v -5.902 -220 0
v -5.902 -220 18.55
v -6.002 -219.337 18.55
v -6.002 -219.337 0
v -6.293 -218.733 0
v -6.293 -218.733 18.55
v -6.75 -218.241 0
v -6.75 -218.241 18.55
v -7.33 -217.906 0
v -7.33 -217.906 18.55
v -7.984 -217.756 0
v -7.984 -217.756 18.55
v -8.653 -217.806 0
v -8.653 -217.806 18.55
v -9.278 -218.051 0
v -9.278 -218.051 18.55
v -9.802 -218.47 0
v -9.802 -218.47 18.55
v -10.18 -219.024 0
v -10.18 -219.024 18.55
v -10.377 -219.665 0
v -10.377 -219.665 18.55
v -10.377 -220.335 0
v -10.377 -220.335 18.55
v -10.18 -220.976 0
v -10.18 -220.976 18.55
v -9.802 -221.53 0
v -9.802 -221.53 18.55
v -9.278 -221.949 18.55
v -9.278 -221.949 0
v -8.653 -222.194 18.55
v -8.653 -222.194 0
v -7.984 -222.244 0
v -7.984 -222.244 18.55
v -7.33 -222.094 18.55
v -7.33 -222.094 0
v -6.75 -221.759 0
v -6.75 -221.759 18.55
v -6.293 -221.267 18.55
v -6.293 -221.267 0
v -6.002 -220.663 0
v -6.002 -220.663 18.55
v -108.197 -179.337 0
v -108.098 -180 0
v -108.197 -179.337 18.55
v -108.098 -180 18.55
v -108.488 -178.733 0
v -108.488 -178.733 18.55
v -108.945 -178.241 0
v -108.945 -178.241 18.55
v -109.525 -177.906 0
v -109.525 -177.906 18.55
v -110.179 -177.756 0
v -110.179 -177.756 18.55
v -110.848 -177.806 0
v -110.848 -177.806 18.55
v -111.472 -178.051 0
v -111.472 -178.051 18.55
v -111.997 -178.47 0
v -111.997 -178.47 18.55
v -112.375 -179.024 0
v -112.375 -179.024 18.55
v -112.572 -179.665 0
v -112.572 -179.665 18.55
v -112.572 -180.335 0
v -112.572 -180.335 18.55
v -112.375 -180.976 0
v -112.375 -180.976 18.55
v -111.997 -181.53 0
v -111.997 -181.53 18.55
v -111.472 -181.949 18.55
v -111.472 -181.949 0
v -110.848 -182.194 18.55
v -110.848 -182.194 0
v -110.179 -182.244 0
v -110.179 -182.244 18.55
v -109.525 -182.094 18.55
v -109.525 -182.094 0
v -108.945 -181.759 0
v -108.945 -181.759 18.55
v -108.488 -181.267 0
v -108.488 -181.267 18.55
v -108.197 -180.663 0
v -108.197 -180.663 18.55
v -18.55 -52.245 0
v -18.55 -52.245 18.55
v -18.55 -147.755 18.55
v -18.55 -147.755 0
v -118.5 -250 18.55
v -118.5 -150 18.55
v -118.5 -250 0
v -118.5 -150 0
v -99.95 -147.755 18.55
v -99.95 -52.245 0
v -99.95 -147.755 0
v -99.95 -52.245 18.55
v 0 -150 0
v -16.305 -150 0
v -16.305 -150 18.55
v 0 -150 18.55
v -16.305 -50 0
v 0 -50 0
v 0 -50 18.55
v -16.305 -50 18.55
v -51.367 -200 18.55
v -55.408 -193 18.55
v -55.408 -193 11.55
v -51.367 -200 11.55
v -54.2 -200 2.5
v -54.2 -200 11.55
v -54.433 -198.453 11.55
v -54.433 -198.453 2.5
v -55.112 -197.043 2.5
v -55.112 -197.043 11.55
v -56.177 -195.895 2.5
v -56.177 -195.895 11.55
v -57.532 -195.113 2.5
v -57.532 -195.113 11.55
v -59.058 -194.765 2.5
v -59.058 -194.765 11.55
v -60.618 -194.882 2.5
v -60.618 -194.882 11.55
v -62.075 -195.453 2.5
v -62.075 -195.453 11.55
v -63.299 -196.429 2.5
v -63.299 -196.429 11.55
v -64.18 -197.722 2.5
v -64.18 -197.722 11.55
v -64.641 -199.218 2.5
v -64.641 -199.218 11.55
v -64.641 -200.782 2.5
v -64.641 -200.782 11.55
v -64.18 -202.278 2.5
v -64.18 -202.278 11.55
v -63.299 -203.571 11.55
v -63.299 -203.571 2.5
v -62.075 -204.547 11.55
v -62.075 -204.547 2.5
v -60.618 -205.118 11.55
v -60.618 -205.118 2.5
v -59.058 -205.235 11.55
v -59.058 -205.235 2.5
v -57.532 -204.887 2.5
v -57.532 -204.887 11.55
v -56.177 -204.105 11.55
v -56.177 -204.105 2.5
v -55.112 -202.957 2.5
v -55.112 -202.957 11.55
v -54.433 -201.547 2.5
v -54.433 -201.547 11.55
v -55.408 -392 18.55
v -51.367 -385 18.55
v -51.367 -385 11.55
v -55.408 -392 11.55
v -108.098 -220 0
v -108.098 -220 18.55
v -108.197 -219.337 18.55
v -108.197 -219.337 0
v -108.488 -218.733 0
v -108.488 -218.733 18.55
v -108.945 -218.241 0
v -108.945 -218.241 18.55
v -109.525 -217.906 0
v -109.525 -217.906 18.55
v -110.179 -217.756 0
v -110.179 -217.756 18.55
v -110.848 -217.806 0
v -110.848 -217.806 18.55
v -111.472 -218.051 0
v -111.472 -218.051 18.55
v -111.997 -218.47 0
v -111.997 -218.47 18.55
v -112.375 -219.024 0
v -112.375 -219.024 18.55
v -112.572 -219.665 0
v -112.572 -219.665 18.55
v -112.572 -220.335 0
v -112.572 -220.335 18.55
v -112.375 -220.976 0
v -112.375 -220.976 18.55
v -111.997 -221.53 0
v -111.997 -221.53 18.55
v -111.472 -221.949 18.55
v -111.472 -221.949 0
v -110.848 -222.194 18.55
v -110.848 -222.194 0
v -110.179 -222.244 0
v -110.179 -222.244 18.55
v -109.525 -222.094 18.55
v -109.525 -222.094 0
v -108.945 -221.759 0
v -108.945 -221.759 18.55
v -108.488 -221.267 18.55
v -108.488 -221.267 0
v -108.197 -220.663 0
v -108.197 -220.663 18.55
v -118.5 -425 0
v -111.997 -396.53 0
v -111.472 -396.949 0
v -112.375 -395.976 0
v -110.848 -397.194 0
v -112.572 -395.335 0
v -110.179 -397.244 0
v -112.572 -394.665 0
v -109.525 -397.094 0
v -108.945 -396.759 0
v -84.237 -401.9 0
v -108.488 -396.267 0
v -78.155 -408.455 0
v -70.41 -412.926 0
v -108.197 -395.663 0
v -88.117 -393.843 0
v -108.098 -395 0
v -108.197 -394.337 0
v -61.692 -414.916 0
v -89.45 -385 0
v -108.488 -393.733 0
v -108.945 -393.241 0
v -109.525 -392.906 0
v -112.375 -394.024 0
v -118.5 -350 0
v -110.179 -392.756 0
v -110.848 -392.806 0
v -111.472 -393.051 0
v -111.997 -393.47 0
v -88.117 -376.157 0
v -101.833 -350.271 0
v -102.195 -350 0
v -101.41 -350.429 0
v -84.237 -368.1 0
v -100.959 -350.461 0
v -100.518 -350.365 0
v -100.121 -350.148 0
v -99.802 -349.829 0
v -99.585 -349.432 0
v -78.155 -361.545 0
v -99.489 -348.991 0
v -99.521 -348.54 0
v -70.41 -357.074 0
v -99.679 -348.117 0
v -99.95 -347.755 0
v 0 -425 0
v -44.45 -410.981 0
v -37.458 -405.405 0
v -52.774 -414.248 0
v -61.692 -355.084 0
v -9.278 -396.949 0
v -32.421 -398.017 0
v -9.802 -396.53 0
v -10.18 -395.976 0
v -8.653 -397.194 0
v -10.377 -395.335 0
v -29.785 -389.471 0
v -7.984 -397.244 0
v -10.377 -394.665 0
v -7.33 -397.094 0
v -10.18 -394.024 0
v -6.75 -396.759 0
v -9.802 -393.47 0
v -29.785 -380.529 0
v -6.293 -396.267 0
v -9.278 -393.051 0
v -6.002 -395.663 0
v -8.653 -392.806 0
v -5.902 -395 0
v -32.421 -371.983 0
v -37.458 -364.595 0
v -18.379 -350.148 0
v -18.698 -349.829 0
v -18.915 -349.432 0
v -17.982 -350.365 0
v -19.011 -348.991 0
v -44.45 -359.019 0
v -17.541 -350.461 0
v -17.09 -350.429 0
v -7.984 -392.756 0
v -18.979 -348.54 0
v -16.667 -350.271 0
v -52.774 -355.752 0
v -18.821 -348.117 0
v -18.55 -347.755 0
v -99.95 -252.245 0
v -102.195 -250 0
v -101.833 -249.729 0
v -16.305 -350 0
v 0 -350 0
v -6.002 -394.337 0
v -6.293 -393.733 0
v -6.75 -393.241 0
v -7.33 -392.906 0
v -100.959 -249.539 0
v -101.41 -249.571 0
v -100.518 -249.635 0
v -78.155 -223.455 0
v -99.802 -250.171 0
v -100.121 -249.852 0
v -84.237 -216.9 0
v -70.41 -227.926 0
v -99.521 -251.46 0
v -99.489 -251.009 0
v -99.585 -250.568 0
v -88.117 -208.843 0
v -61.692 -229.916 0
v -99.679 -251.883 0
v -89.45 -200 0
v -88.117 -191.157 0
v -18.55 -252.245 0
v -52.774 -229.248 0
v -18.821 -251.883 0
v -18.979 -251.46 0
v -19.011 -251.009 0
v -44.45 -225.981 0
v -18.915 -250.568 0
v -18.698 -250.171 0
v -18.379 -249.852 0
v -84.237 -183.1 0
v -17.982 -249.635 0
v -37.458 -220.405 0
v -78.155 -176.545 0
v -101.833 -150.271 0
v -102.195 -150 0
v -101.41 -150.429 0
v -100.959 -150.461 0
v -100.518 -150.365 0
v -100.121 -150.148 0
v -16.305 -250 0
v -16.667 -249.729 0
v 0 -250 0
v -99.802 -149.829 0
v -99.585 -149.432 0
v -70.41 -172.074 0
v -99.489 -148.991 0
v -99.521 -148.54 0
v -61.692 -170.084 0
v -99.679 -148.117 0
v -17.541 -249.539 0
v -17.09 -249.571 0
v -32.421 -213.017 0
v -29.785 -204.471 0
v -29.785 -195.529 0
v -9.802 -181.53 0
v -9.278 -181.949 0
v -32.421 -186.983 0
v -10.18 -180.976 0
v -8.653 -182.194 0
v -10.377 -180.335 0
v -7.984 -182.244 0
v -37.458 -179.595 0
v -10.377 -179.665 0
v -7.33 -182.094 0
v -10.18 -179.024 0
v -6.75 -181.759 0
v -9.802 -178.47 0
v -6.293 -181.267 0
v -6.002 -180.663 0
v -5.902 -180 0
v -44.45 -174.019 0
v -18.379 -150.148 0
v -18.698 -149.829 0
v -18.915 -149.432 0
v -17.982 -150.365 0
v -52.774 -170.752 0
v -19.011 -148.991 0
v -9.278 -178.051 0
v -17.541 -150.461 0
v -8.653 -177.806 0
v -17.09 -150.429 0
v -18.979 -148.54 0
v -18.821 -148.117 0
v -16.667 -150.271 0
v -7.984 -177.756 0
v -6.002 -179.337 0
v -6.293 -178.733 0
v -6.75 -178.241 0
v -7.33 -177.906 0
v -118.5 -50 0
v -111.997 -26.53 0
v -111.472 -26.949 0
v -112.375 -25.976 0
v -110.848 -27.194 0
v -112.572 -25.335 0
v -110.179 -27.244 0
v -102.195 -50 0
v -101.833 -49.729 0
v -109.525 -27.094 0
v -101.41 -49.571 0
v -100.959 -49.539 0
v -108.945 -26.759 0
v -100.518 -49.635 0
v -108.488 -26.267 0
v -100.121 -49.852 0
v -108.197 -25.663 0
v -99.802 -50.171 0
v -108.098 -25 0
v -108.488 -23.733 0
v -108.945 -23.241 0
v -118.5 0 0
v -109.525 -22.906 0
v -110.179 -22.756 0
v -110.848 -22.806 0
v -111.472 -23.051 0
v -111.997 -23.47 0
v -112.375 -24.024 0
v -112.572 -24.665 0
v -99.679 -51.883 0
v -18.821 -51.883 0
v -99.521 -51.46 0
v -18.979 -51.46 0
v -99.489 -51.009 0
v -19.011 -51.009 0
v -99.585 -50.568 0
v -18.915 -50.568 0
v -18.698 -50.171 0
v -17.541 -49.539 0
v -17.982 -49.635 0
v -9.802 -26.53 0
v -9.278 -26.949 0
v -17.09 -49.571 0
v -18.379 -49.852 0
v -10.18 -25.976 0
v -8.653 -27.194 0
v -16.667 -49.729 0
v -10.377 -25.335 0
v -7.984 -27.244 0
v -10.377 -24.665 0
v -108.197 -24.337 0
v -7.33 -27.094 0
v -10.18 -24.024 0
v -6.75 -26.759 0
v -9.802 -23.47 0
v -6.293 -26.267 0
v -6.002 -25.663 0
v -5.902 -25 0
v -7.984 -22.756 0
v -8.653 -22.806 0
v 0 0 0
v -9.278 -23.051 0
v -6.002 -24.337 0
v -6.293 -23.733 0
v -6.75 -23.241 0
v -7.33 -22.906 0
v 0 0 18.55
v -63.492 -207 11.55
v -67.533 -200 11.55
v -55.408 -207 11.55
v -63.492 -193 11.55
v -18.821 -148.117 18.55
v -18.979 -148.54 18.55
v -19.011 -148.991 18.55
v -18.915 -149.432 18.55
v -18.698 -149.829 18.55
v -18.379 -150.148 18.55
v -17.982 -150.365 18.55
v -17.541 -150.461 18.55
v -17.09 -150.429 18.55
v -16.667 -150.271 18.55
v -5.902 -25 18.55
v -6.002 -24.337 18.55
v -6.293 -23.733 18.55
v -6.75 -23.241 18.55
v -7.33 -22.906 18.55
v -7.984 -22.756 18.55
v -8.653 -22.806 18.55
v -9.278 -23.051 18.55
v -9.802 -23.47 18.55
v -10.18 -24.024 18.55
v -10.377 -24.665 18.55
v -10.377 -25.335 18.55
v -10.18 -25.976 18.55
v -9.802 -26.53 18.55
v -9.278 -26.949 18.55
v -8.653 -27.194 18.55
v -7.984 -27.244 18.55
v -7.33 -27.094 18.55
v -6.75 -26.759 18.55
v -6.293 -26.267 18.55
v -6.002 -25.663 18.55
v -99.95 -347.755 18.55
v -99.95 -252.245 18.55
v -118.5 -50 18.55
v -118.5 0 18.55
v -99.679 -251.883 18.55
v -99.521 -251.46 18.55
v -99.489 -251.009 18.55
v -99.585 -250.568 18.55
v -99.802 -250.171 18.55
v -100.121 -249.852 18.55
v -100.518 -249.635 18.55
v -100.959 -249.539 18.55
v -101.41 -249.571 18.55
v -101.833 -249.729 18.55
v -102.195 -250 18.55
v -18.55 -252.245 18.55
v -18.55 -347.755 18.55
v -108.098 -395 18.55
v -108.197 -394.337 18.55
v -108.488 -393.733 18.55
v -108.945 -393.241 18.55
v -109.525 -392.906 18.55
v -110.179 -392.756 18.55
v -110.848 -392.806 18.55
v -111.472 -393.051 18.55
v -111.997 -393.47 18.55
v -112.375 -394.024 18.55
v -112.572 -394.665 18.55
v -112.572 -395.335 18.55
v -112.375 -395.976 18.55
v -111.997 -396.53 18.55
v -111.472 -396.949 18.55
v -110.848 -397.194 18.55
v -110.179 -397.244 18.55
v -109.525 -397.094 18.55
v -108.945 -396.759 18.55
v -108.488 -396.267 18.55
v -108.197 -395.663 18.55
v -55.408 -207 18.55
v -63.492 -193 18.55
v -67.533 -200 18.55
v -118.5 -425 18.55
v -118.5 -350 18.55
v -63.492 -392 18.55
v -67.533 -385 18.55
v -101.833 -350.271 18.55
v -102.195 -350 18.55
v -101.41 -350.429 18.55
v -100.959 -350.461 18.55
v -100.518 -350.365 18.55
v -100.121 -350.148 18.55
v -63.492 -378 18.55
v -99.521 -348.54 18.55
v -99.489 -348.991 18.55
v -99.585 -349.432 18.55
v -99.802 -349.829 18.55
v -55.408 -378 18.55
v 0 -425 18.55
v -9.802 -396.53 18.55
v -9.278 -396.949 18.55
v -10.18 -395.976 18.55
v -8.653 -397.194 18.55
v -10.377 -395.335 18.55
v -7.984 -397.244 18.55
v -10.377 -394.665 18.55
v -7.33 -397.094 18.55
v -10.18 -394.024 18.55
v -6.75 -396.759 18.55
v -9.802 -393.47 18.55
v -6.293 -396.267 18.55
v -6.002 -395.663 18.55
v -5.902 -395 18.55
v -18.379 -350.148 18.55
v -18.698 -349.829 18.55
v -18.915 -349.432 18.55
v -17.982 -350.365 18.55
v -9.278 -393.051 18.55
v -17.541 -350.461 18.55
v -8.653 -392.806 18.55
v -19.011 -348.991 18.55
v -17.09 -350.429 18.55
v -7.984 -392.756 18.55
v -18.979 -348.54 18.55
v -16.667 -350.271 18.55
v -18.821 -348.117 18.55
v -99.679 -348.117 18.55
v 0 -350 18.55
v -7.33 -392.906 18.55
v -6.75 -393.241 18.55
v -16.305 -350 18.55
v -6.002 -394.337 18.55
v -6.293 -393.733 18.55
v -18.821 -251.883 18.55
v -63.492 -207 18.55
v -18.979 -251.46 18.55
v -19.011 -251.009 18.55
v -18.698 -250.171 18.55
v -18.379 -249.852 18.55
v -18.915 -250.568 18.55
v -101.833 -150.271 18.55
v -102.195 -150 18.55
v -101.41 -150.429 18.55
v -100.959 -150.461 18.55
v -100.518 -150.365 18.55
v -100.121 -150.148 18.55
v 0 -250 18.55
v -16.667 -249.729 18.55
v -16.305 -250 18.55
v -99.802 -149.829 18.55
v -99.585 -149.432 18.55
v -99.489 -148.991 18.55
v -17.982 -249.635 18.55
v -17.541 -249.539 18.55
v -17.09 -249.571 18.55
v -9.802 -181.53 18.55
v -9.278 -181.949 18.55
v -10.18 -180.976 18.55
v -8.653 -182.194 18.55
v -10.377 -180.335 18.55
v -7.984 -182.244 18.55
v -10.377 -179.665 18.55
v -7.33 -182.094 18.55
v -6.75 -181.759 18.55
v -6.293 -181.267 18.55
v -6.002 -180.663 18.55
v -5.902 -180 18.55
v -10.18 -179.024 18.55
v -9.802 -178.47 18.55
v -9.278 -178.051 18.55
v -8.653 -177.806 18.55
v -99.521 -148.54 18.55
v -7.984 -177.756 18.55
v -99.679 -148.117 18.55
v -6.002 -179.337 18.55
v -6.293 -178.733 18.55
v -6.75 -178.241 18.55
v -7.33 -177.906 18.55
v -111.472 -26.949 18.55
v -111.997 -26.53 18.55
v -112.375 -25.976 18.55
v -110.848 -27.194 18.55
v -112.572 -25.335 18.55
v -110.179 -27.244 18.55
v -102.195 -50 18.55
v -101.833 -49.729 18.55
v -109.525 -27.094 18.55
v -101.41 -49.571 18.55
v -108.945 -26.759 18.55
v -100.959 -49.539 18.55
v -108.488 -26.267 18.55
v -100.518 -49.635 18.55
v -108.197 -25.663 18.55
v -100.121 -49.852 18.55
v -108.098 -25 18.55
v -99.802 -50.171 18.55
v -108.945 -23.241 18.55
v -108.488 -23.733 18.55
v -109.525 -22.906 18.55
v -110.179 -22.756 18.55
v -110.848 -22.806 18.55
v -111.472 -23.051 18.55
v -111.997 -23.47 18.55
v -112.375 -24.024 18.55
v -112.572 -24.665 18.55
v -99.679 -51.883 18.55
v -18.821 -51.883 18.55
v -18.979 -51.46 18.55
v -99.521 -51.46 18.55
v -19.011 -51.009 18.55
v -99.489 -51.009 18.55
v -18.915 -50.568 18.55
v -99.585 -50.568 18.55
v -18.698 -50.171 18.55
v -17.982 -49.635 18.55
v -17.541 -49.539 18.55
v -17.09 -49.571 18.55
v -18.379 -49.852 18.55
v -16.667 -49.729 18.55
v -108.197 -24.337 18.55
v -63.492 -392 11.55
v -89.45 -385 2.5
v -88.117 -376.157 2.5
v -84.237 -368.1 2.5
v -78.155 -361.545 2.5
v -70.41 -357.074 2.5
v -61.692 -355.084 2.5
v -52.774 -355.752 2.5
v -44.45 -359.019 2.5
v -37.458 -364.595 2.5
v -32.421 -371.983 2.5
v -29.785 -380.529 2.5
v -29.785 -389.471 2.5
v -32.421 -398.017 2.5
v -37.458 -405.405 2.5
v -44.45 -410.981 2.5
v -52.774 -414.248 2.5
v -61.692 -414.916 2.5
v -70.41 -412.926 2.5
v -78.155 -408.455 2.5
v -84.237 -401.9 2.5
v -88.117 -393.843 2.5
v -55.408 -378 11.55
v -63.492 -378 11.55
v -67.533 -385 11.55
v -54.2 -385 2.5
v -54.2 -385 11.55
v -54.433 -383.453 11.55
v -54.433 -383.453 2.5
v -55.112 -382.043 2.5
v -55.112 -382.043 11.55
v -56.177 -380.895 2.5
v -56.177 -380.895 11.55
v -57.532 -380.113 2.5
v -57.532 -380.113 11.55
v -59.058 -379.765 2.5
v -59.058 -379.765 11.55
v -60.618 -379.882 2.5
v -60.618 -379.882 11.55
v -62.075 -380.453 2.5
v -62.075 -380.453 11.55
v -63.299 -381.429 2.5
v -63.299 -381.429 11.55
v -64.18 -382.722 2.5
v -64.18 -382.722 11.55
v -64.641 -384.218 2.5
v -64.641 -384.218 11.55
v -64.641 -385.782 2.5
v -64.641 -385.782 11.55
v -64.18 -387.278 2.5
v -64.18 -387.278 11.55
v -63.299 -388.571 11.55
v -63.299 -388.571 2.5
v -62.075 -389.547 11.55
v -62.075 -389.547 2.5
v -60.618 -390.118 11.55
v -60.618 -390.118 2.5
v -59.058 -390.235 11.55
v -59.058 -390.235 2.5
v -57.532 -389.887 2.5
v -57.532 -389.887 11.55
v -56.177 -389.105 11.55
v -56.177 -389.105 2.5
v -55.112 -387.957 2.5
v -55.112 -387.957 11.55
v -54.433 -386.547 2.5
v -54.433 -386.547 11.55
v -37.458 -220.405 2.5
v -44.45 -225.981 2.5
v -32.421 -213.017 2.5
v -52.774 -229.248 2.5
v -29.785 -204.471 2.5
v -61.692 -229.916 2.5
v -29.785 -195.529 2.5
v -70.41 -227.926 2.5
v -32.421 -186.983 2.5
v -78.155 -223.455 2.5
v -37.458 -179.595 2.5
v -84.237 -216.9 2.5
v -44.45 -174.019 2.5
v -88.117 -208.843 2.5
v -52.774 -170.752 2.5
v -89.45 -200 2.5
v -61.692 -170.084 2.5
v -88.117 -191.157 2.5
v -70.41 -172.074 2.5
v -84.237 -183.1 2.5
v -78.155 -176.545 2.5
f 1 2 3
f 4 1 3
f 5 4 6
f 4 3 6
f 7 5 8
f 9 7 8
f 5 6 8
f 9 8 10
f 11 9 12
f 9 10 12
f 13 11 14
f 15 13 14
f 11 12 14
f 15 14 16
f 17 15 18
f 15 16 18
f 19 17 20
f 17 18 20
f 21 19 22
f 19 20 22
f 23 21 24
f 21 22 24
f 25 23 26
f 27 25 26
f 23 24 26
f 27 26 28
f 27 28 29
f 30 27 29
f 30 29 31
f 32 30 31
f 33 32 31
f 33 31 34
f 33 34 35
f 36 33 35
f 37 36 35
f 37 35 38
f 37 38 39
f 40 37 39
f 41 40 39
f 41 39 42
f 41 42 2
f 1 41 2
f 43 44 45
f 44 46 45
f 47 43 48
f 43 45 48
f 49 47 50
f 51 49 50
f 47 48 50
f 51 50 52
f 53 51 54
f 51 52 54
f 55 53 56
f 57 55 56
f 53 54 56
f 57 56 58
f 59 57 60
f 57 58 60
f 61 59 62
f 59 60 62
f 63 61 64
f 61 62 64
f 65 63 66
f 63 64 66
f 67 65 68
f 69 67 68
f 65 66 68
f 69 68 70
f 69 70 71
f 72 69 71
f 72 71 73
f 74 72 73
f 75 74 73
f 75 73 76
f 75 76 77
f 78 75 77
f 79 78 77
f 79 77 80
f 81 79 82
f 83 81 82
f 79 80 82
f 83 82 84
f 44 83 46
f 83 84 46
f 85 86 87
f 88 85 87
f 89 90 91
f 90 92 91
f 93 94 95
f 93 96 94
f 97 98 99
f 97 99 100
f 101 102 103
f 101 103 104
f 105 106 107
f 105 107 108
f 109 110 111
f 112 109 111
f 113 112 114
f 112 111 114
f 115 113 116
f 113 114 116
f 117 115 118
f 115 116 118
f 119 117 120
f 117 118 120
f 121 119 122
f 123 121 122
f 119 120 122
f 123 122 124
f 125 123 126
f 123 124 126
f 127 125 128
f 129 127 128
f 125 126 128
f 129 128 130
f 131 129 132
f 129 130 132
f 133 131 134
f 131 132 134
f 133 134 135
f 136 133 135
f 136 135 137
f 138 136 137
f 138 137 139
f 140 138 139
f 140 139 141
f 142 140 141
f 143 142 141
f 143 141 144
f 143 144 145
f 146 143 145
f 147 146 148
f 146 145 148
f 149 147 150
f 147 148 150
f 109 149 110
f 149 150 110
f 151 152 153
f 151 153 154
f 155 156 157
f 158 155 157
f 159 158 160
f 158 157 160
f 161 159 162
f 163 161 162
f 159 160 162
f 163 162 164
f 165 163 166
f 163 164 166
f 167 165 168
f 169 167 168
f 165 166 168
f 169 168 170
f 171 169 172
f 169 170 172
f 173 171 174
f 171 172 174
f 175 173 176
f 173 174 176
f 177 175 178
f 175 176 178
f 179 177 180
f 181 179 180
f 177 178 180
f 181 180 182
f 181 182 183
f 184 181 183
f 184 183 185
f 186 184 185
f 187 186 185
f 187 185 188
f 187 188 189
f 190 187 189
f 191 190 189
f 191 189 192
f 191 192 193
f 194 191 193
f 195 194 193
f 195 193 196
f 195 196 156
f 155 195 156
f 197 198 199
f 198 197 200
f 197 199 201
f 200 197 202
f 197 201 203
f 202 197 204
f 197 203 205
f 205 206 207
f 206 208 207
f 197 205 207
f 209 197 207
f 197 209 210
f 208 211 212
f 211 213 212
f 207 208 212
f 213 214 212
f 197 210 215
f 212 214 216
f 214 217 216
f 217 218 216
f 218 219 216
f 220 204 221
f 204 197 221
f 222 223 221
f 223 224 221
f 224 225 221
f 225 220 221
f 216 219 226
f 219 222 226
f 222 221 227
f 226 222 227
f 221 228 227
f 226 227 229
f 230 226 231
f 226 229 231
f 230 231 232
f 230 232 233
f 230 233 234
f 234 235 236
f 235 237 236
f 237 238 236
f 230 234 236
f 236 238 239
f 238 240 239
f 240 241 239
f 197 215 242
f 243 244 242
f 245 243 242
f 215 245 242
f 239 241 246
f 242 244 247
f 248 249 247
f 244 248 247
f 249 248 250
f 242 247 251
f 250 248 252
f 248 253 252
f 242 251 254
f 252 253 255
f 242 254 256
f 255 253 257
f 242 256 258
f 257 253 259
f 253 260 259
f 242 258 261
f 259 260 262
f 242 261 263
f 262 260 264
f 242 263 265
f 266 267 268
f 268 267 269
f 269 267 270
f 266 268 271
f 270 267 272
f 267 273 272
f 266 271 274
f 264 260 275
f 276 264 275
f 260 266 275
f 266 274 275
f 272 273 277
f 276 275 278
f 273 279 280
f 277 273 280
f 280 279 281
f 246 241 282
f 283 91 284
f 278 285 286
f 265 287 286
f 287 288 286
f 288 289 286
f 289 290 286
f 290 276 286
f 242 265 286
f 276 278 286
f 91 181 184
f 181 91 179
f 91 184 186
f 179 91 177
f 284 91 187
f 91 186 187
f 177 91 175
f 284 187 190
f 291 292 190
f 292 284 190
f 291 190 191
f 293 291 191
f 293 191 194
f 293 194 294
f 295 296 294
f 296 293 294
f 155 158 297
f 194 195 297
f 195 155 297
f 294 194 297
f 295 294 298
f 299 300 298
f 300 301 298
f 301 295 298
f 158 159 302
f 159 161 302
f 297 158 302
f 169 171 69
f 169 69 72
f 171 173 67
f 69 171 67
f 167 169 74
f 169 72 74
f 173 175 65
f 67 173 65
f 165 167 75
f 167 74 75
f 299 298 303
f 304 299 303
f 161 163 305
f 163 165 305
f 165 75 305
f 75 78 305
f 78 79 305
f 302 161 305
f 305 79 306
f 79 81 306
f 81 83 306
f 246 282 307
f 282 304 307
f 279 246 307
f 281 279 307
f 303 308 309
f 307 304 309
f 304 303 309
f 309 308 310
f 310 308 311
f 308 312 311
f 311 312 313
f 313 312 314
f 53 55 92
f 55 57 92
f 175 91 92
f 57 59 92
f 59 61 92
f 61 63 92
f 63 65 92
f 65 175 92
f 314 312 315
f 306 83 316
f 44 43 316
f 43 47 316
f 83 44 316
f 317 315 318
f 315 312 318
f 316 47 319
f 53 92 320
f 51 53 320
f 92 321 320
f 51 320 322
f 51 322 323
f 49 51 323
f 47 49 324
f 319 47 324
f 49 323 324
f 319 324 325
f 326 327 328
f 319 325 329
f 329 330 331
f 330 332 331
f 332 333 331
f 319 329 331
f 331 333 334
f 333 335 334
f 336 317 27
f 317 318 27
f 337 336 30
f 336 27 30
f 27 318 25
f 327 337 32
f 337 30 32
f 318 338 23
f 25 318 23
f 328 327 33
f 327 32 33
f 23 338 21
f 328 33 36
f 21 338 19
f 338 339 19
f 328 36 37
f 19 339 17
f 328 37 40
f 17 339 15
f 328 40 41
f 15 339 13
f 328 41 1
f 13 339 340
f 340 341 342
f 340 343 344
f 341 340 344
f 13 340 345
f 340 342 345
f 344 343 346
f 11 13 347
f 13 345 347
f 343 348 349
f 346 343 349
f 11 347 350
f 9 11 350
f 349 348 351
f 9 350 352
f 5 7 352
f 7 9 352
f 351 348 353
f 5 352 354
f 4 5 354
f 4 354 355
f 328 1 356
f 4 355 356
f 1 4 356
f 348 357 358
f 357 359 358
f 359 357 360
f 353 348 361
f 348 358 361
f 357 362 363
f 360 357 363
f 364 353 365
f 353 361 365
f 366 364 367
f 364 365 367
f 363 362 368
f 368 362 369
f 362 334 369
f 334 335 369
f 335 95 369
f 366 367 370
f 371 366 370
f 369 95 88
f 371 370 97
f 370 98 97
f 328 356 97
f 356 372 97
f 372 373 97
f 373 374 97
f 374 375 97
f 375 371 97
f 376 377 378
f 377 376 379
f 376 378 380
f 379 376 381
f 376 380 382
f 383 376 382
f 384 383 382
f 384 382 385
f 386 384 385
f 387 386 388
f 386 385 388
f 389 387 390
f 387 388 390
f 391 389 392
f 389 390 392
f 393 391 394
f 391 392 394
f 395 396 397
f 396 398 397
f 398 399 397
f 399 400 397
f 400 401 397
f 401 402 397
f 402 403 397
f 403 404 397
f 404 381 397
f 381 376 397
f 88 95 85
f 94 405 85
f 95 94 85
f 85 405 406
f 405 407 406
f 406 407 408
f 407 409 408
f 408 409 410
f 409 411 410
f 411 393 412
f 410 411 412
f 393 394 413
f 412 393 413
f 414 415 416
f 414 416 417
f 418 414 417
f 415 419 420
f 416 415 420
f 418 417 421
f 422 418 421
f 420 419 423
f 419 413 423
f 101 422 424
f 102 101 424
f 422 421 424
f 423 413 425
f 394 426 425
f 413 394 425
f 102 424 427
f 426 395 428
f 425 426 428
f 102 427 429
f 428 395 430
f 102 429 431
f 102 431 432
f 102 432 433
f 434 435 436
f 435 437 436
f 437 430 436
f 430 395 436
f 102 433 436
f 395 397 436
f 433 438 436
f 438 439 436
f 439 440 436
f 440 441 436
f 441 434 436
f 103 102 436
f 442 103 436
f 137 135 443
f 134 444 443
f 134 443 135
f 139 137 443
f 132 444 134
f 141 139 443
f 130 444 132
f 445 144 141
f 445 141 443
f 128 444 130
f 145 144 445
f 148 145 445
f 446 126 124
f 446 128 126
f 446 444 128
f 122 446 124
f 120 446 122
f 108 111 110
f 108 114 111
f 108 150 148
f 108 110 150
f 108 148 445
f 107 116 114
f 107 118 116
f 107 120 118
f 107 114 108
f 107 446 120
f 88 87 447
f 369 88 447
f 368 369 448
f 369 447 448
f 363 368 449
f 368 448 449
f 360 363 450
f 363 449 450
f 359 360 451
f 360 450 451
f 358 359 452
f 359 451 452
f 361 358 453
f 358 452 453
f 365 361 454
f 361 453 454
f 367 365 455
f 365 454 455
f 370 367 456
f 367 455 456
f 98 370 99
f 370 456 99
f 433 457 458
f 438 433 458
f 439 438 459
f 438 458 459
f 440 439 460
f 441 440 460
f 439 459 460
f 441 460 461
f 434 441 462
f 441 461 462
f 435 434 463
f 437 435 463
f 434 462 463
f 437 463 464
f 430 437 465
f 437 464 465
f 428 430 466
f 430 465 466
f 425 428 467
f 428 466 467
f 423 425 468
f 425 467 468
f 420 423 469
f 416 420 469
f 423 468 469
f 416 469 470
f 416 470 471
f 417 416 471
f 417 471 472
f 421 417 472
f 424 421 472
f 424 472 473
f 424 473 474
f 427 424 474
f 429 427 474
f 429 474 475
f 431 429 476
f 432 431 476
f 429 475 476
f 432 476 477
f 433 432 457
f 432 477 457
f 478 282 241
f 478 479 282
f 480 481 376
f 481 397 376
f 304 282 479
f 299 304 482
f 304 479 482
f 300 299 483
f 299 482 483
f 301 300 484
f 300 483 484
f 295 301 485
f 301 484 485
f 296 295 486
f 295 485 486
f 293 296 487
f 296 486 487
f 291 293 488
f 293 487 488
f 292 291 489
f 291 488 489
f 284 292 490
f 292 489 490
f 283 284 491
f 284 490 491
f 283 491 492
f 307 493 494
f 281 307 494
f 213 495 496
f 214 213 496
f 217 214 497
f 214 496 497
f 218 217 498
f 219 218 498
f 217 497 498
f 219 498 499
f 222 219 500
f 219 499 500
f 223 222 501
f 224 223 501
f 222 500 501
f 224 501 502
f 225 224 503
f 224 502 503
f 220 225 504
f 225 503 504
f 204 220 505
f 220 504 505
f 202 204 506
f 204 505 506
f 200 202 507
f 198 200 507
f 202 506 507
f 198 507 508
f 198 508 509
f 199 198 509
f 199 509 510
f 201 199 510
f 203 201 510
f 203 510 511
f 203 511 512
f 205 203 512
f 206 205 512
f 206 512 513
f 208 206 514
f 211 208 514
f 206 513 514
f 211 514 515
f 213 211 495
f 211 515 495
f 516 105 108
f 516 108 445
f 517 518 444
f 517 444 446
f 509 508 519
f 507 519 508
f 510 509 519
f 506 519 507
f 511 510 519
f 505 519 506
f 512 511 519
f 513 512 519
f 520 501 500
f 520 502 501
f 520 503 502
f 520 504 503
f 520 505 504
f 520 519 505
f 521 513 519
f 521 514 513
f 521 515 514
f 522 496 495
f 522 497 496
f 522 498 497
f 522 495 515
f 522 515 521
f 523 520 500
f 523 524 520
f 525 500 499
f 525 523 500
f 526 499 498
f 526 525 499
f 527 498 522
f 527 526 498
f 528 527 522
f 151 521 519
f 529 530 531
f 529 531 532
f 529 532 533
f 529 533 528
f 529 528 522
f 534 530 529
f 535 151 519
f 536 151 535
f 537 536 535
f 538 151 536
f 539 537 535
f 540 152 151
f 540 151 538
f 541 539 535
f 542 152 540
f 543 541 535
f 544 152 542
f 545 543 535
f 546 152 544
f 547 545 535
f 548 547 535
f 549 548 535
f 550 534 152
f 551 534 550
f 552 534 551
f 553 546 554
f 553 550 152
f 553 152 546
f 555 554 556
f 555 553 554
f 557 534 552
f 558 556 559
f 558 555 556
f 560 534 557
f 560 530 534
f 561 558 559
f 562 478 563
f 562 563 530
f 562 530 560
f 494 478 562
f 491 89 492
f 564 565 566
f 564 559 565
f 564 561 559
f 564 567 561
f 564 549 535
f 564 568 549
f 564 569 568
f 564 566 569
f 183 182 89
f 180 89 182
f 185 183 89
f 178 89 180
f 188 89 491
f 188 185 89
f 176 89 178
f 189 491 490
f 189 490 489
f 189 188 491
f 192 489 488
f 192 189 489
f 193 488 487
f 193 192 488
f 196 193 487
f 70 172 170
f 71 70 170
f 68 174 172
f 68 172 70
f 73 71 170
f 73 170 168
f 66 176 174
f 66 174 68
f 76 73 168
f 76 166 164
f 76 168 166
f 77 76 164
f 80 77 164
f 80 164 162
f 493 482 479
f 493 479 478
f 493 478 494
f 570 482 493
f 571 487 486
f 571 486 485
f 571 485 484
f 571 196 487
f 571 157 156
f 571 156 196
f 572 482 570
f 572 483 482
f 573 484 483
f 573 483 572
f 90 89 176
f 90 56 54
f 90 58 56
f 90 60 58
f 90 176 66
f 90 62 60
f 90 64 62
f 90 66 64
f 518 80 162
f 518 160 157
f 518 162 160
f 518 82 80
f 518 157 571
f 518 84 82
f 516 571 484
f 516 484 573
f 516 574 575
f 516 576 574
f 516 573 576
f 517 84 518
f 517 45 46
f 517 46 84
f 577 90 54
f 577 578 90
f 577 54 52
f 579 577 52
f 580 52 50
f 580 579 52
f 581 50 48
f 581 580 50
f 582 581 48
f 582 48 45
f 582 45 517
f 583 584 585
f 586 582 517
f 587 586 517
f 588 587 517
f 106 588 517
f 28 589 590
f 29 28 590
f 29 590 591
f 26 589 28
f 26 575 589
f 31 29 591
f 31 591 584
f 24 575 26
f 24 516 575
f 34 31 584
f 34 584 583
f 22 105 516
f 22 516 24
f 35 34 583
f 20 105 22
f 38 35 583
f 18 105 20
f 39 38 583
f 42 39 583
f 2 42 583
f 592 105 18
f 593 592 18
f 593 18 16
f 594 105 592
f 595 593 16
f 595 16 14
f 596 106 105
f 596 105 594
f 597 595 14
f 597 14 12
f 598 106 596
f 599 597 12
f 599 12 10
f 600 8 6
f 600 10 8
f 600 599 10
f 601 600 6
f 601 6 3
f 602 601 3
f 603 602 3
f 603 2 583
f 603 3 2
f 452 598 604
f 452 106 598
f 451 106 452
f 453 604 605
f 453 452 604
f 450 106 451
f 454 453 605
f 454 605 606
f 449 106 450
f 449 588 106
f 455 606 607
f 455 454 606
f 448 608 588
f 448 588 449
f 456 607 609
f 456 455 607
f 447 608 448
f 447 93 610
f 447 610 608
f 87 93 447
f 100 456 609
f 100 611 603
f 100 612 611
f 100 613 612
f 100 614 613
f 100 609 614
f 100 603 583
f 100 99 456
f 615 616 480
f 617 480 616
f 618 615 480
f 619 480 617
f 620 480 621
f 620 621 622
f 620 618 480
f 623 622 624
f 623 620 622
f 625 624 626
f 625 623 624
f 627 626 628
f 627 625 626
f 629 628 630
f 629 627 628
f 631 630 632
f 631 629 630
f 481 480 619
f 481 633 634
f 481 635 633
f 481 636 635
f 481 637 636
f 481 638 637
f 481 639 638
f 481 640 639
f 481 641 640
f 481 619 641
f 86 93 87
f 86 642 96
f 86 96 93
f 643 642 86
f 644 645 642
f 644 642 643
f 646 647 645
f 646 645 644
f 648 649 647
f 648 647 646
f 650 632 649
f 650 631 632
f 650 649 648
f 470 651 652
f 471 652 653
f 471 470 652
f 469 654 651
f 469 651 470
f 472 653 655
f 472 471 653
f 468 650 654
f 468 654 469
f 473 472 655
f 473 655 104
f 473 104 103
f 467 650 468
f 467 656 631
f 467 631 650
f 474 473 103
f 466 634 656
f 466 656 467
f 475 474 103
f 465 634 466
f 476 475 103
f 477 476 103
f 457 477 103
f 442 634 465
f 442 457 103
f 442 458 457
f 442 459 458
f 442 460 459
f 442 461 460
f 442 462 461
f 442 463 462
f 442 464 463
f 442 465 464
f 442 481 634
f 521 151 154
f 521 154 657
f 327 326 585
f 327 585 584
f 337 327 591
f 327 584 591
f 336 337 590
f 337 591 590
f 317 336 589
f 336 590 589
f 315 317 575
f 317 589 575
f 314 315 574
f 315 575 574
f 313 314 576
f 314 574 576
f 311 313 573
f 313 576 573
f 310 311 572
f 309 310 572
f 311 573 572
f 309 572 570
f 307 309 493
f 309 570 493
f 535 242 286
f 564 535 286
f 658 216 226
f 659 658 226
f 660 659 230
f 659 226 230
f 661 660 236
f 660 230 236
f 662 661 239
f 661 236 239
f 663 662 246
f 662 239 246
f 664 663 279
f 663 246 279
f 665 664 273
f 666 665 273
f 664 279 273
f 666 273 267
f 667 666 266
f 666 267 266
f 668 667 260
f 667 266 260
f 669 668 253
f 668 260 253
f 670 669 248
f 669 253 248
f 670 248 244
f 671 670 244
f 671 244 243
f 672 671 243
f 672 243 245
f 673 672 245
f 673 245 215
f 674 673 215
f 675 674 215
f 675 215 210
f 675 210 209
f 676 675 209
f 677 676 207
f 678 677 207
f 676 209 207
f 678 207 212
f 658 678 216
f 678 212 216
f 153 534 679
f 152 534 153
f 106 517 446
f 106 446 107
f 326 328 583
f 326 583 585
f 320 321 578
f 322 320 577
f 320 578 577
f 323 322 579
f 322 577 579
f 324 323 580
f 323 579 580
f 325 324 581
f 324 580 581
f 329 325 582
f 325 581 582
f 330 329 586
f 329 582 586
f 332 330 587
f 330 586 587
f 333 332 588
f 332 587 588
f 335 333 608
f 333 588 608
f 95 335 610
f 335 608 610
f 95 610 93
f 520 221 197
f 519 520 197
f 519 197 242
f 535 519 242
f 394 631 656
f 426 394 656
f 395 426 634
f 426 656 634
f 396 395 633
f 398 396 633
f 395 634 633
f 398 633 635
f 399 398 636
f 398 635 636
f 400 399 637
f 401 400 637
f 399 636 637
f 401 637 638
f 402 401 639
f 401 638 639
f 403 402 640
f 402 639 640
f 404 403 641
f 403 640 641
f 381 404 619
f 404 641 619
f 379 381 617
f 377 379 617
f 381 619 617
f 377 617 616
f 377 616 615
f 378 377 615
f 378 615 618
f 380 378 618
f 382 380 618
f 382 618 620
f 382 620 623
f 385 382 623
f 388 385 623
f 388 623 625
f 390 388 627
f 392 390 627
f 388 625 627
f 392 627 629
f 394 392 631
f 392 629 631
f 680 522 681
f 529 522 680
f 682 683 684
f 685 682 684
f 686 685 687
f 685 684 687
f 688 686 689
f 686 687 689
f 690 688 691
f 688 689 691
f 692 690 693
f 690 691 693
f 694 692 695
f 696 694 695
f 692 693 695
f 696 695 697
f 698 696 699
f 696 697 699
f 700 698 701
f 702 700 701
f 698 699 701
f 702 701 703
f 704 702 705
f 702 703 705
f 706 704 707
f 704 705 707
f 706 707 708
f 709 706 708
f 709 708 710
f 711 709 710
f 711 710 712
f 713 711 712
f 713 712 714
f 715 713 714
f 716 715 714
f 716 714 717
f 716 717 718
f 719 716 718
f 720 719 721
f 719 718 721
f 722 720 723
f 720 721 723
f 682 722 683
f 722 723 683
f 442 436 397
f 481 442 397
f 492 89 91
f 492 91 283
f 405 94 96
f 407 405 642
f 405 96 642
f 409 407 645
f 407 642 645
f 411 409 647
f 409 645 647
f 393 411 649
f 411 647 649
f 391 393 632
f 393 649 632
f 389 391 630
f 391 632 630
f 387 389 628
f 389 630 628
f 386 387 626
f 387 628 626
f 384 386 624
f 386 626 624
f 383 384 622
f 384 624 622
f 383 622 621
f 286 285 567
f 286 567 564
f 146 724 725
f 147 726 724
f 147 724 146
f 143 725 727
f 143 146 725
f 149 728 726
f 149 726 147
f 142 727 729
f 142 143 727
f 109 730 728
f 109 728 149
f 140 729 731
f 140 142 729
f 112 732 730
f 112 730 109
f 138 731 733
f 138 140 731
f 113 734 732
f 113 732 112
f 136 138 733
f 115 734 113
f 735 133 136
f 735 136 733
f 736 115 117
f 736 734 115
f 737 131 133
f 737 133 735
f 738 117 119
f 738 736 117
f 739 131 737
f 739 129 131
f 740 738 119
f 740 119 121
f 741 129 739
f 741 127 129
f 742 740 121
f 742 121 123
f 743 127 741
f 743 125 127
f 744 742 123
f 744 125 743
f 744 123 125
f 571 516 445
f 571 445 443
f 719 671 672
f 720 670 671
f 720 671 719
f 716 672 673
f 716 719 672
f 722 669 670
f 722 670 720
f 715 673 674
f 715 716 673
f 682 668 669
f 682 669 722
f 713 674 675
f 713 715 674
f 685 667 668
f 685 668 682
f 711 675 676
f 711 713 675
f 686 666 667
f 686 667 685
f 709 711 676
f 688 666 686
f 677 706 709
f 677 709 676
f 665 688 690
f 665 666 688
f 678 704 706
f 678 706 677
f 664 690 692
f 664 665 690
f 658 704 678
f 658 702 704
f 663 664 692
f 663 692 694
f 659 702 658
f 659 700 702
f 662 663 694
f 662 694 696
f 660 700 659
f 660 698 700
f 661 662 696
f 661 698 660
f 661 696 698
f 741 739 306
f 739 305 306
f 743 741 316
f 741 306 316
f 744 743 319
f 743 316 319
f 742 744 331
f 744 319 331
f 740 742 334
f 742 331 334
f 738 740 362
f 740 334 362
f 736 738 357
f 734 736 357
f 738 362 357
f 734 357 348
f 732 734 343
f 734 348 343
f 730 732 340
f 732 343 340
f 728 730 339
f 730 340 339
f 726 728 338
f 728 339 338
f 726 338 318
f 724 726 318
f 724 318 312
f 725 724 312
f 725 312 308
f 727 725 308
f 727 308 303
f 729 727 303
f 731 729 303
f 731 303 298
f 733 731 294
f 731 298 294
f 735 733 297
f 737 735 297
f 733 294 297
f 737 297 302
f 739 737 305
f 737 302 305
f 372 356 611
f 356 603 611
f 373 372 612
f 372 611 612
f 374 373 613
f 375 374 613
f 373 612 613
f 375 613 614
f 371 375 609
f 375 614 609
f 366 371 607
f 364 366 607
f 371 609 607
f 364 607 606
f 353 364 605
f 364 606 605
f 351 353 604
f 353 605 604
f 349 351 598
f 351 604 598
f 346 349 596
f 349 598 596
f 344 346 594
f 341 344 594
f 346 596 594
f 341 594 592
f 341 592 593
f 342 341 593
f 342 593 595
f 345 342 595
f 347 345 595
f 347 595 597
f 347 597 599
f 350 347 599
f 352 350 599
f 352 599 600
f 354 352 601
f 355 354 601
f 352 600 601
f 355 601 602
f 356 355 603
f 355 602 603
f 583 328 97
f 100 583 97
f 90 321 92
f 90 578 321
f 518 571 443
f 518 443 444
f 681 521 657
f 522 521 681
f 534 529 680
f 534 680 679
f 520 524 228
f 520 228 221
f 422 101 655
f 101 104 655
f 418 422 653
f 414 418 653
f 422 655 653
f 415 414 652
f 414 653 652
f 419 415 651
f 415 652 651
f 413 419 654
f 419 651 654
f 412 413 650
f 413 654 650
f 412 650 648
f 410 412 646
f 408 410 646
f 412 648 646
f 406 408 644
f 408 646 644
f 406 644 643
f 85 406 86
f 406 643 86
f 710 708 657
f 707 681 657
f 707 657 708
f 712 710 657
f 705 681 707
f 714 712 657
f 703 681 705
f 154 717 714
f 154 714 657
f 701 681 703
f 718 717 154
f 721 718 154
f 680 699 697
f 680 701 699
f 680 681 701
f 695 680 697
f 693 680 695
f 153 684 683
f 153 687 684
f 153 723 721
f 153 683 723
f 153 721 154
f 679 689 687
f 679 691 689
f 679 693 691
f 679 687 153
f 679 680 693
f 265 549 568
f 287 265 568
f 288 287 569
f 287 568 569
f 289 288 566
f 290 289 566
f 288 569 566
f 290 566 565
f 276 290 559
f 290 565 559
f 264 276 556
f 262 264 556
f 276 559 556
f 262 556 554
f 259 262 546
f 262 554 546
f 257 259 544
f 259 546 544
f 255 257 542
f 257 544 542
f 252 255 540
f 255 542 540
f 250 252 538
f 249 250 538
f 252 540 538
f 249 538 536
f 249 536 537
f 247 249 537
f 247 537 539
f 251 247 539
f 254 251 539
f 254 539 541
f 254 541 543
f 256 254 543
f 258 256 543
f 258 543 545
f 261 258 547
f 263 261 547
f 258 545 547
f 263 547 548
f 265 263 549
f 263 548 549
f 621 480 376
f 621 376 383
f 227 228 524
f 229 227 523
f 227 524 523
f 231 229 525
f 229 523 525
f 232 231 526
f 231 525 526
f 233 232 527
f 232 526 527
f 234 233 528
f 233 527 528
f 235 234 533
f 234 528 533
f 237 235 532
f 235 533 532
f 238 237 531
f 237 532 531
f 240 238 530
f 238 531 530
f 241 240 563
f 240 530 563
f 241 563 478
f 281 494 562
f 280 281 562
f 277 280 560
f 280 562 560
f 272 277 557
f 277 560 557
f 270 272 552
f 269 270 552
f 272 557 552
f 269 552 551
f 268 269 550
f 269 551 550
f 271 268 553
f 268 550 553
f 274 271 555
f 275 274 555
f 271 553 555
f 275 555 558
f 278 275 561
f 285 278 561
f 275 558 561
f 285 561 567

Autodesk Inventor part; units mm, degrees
ref_plane "YZ Plane" through (0, 0, 0) normal (1, 0, 0) x (0, 1, 0)
ref_plane "XZ Plane" through (0, 0, 0) normal (0, 1, 0) x (-1, 0, 0)
ref_plane "XY Plane" through (0, 0, 0) normal (0, 0, 1) x (1, 0, 0)
sketch "Esquisse1" plane through (0, 0, 0) normal (0, 0, 1) x (1, 0, 0)
  line L0 (0, 0) -> (-118.5, 0)
  line L1 (-118.5, 0) -> (-118.5, -425)
  line L2 (-118.5, -425) -> (0, -425)
  line L3 (0, -425) -> (0, 0)
  dimension "d0" = 425
  dimension "d3" = 118.5
extrude "Extrusion1" add sketch "Esquisse1" along normal blind 18.55
sketch "Esquisse2" plane through (0, 0, 18.55) normal (0, 0, 1) x (1, 0, 0)
  line L0 (-118.5, 0) -> (-118.5, -425) construction
  line L1 (-118.5, -50) -> (-99.95, -50)
  line L2 (-99.95, -50) -> (-99.95, -150)
  line L3 (-99.95, -150) -> (-118.5, -150)
  line L4 (-118.5, -150) -> (-118.5, -50)
  line L5 (-118.5, -250) -> (-99.95, -250)
  line L6 (-99.95, -250) -> (-99.95, -350)
  line L7 (-99.95, -350) -> (-118.5, -350)
  line L8 (-118.5, -350) -> (-118.5, -250)
  line L9 (0, 0) -> (-118.5, 0) projected
  line L10 (-118.5, -425) -> (0, -425) projected
  line L11 (-59.25, 0) -> (-59.25, -425) construction
  line L12 (0, 0) -> (0, -425) construction
  line L13 (0, -50) -> (-18.55, -50)
  line L14 (-18.55, -50) -> (-18.55, -150)
  line L15 (-18.55, -150) -> (0, -150)
  line L16 (0, -150) -> (0, -50)
  line L17 (0, -250) -> (-18.55, -250)
  line L18 (-18.55, -250) -> (-18.55, -350)
  line L19 (-18.55, -350) -> (0, -350)
  line L20 (0, -350) -> (0, -250)
  dimension "d27" = 18.55
  dimension "d28" = 100
  dimension "d29" = 100
  dimension "d30" = 100
  dimension "d31" = 50
  dimension "d32" = 75
extrude "Extrusion2" cut sketch "Esquisse2" against normal blind 18.55
sketch "Esquisse3" plane through (0, 0, 18.55) normal (0, 0, 1) x (1, 0, 0)
  line L0 (0, -425) -> (0, 0) projected
  line L1 (-118.5, -425) -> (0, -425) projected
  line L2 (-118.5, -350) -> (-118.5, -425) projected
  line L3 (-67.5329, -385) -> (-63.4915, -378)
  line L4 (-63.4915, -378) -> (-55.4085, -378)
  line L5 (-55.4085, -378) -> (-51.3671, -385)
  line L6 (-51.3671, -385) -> (-55.4085, -392)
  line L7 (-55.4085, -392) -> (-63.4915, -392)
  line L8 (-63.4915, -392) -> (-67.5329, -385)
  line L9 (-99.95, -250) -> (-99.95, -350) projected
  line L10 (-18.55, -350) -> (-18.55, -250) projected
  line L11 (-55.4085, -207) -> (-63.4915, -207)
  line L12 (-63.4915, -207) -> (-67.5329, -200)
  line L13 (-67.5329, -200) -> (-63.4915, -193)
  line L14 (-63.4915, -193) -> (-55.4085, -193)
  line L15 (-55.4085, -193) -> (-51.3671, -200)
  line L16 (-51.3671, -200) -> (-55.4085, -207)
  line L17 (-118.5, -150) -> (-118.5, -250) projected
  line L18 (-118.5, -200) -> (-59.45, -200) construction
  point P0 (-59.45, -385)
  dimension "d43" = 14
  dimension "d44" = 40.5
  dimension "d45" = 40.9
  dimension "d46" = 40
extrude "Extrusion3" cut sketch "Esquisse3" against normal blind 7
sketch "Esquisse4" plane through (0, 0, 18.55) normal (0, 0, 1) x (1, 0, 0)
  circle A0 centre (-101.0725, -51.1225) radius 1.5875
  circle A1 centre (-17.4275, -51.1225) radius 1.5875
  circle A2 centre (-101.0725, -148.8775) radius 1.5875
  circle A3 centre (-17.4275, -148.8775) radius 1.5875
  line L0 (-118.5, -50) -> (-99.95, -50) projected
  line L1 (-99.95, -50) -> (-101.0725, -51.1225) construction
  line L2 (-99.95, -150) -> (-99.95, -50) projected
  line L3 (-101.0725, -148.8775) -> (-99.95, -150) construction
  line L4 (-99.95, -150) -> (-118.5, -150) projected
  line L5 (-18.55, -50) -> (0, -50) projected
  line L6 (-18.55, -50) -> (-17.4275, -51.1225) construction
  line L7 (-18.55, -150) -> (-18.55, -50) projected
  line L8 (-18.55, -150) -> (-17.4275, -148.8775) construction
  line L9 (0, -150) -> (-18.55, -150) projected
  line L10 (-118.5, -150) -> (-118.5, -250) projected
  line L11 (-118.5, -200) -> (0, -200) construction
  line L12 (0, -250) -> (0, -150) projected
  circle A4 centre (-101.0725, -348.8775) radius 1.5875
  circle A5 centre (-17.4275, -348.8775) radius 1.5875
  circle A6 centre (-101.0725, -251.1225) radius 1.5875
  circle A7 centre (-17.4275, -251.1225) radius 1.5875
  line L13 (-99.95, -350) -> (-101.0725, -348.8775) construction
  line L14 (-101.0725, -251.1225) -> (-99.95, -250) construction
  line L15 (-18.55, -350) -> (-17.4275, -348.8775) construction
  line L16 (-18.55, -250) -> (-17.4275, -251.1225) construction
  point P0 (0, 0)
  point P1 (-99.95, -350)
  point P2 (-99.95, -250)
  point P3 (-18.55, -350)
  point P4 (-18.55, -250)
  dimension "d34" = 3.175
  dimension "d51" = 45
  dimension "d52" = 45
  dimension "d53" = 45
  dimension "d54" = 45
extrude "Extrusion4" cut sketch "Esquisse4" against normal blind 18.55
sketch "Esquisse5" plane through (0, 0, 18.55) normal (0, 0, 1) x (1, 0, 0)
  circle A0 centre (-110.3475, -25) radius 2.25
  circle A1 centre (-110.3475, -180) radius 2.25
  circle A2 centre (-110.3475, -395) radius 2.25
  line L0 (-118.5, -50) -> (-102.1951, -50) projected
  line L1 (-110.3475, -50) -> (-110.3475, -425) construction
  line L2 (-118.5, -425) -> (0, -425) projected
  line L3 (-110.3475, -50) -> (-110.3475, 0) construction
  line L4 (0, 0) -> (-118.5, 0) projected
  line L5 (-99.95, -350) -> (-118.5, -350) projected
  line L6 (-102.1951, -150) -> (-118.5, -150) projected
  line L7 (-59.25, 0) -> (-59.25, -425) construction
  circle A3 centre (-8.1525, -25) radius 2.25
  circle A4 centre (-8.1525, -180) radius 2.25
  circle A5 centre (-8.1525, -395) radius 2.25
  line L8 (0, -50) -> (-16.3049, -50)
  line L9 (-8.1525, -50) -> (-8.1525, -425) construction
  line L10 (-8.1525, -50) -> (-8.1525, 0) construction
  line L11 (-16.9625, -350.1) -> (0, -350)
  line L12 (-16.3049, -150) -> (0, -150)
  circle A6 centre (-110.3475, -220) radius 2.25
  line L13 (-118.5, -250) -> (-102.1951, -250) projected
  circle A7 centre (-8.1525, -220) radius 2.25
  point P0 (-101.5375, -350.1)
  dimension "d37" = 4.5
  dimension "d38" = 30
  dimension "d39" = 45
  dimension "d40" = 30
  dimension "d56" = 30
extrude "Extrusion5" cut sketch "Esquisse5" against normal blind 120
sketch "Esquisse6" plane through (0, 0, 11.55) normal (0, 0, 1) x (1, 0, 0)
  circle A0 centre (-59.45, -385) radius 5.25
  line L0 (-63.4915, -392) -> (-67.5329, -385) projected
  line L1 (-63.4915, -378) -> (-55.4085, -378) projected
  line L2 (-63.4915, -392) -> (-55.4085, -378) construction
  line L3 (-63.4915, -378) -> (-55.4085, -392) construction
  circle A1 centre (-59.45, -200) radius 5.25
  line L4 (-63.4915, -193) -> (-55.4085, -207) construction
  point P0 (0, 0)
  dimension "d47" = 10.5
extrude "Extrusion6" cut sketch "Esquisse6" against normal blind 18
sketch "Esquisse7" plane through (0, 0, 0) normal (0, 0, -1) x (-1, 0, 0)
  circle A0 centre (59.45, -200) radius 5.25 construction
  circle A1 centre (59.45, -200) radius 30
  circle A2 centre (59.45, -385) radius 5.25 construction
  circle A3 centre (59.45, -385) radius 30
  point P0 (0, 0)
  dimension "d57" = 60
extrude "Extrusion7" cut sketch "Esquisse7" against normal blind 2.5
properties part number "rail"
